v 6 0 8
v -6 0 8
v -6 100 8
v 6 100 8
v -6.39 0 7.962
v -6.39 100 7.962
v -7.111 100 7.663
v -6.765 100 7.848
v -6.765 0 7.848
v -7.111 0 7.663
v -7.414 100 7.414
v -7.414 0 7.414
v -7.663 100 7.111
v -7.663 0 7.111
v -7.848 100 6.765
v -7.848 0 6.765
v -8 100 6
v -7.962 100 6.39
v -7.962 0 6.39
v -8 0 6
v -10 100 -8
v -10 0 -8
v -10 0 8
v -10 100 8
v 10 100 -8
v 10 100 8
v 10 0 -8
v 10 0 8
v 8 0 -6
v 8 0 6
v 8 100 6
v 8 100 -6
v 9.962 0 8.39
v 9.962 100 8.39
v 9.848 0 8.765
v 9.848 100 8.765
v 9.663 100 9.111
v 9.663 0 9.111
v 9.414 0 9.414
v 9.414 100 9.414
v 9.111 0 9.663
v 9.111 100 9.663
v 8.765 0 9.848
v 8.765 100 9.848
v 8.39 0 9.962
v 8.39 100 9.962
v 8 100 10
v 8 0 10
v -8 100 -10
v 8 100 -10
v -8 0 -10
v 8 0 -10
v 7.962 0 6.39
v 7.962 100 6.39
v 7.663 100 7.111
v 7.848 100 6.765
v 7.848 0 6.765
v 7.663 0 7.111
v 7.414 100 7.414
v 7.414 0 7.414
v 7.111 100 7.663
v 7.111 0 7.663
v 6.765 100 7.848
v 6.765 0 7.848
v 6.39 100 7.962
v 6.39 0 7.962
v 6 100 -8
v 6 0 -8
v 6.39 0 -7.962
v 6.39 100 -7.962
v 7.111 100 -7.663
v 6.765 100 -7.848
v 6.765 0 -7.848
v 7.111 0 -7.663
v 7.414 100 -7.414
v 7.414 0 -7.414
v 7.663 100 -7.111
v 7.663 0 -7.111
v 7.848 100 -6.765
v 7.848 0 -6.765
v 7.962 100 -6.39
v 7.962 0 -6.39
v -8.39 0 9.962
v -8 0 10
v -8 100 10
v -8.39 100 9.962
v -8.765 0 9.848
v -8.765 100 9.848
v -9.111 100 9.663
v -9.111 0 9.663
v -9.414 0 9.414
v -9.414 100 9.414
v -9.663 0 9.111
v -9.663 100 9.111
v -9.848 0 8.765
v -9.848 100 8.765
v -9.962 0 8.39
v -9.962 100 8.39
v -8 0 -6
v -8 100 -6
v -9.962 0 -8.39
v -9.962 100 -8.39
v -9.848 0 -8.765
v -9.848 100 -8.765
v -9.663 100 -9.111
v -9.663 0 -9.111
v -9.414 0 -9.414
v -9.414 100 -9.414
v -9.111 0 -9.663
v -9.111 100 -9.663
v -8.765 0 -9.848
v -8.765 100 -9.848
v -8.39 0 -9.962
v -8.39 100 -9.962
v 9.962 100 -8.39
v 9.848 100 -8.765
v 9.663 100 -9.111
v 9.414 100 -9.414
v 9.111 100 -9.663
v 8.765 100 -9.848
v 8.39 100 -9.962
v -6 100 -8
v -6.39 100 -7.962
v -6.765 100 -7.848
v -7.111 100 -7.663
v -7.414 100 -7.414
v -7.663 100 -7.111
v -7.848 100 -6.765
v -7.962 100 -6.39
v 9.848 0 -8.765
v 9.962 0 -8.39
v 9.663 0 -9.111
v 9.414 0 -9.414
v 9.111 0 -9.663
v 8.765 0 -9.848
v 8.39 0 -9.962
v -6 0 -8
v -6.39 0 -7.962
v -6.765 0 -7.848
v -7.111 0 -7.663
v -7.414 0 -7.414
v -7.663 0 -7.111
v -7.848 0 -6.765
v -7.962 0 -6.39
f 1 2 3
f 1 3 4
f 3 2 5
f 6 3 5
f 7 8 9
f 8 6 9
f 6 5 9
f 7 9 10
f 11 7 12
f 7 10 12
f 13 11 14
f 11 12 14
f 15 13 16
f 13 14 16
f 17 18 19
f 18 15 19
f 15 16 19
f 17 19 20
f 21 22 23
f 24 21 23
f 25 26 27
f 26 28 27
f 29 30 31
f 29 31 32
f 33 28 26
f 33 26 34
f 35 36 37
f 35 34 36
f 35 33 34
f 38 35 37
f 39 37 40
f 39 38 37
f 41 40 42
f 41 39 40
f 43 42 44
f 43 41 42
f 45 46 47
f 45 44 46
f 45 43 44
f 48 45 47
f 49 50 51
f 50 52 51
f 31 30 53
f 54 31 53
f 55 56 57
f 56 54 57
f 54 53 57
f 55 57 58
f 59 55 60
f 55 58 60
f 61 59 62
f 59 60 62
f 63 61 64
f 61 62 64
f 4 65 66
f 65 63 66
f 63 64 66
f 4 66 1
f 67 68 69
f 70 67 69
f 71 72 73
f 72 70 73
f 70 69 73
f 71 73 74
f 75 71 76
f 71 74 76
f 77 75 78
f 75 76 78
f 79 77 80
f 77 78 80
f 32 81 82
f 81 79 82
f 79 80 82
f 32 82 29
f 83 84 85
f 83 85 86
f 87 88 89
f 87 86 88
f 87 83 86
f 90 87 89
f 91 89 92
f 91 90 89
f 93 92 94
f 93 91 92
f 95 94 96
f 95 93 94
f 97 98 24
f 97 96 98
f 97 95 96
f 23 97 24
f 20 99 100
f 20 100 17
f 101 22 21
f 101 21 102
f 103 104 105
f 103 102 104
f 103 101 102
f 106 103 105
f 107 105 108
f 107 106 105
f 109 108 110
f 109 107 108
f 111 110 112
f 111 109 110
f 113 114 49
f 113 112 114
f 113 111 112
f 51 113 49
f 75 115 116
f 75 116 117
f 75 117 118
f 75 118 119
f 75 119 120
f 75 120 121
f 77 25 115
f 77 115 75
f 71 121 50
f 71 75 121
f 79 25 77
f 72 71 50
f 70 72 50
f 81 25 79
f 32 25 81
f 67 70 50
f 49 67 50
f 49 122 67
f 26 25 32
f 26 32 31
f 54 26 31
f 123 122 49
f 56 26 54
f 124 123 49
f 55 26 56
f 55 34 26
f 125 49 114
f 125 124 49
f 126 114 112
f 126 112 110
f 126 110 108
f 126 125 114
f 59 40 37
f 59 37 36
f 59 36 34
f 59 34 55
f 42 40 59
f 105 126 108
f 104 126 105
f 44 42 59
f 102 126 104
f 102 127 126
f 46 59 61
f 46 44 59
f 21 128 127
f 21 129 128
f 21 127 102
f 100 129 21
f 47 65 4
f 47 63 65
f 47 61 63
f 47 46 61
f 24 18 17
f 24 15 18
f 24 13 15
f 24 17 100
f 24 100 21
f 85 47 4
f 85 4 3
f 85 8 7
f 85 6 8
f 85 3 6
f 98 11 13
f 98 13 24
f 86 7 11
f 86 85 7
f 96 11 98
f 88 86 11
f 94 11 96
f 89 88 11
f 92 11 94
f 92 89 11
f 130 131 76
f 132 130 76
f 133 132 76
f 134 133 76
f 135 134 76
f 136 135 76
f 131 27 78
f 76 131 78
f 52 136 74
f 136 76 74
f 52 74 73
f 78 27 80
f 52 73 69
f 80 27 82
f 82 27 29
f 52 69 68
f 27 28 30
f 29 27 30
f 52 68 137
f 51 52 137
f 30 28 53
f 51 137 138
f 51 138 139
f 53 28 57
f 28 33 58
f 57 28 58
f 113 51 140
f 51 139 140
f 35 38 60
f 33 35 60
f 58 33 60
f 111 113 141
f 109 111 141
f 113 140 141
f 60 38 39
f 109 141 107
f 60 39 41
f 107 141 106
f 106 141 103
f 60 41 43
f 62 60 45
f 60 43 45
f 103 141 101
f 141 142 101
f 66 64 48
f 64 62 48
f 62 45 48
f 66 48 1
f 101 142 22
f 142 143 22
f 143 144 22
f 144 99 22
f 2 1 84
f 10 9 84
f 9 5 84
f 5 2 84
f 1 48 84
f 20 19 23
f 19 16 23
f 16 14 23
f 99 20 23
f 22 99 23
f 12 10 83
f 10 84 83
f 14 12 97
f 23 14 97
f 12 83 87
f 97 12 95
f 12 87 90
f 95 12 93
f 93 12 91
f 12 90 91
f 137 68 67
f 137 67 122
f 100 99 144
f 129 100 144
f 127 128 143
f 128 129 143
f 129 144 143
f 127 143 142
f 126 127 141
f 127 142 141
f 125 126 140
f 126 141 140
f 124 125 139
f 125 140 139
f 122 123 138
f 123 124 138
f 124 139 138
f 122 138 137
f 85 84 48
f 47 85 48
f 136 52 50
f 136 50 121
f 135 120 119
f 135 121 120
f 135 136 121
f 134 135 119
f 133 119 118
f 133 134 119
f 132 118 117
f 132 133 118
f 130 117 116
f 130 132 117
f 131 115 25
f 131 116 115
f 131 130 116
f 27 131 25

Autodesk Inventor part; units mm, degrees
ref_plane "YZ Plane" through (0, 0, 0) normal (1, 0, 0) x (0, 1, 0)
ref_plane "XZ Plane" through (0, 0, 0) normal (0, 1, 0) x (-1, 0, 0)
ref_plane "XY Plane" through (0, 0, 0) normal (0, 0, 1) x (1, 0, 0)
sketch "Sketch1" plane through (0, 0, 0) normal (0, 1, 0) x (-1, 0, 0)
  line L0 (-8, -10) -> (8, -10)
  line L1 (10, -8) -> (10, 8)
  line L2 (8, 10) -> (-8, 10)
  line L3 (-10, 8) -> (-10, -8)
  line L4 (-10, -10) -> (10, 10) construction
  line L5 (10, -10) -> (-10, 10) construction
  line L6 (-6, -8) -> (6, -8)
  line L7 (8, -6) -> (8, 6)
  line L8 (6, 8) -> (-6, 8)
  line L9 (-8, 6) -> (-8, -6)
  line L10 (-8, -8) -> (8, 8) construction
  line L11 (8, -8) -> (-8, 8) construction
  arc A0 (10, 8) -> (8, 10) centre (8, 8) ccw
  arc A1 (8, 6) -> (6, 8) centre (6, 6) ccw
  arc A2 (8, -10) -> (10, -8) centre (8, -8) ccw
  arc A3 (6, -8) -> (8, -6) centre (6, -6) ccw
  arc A4 (-10, -8) -> (-8, -10) centre (-8, -8) ccw
  arc A5 (-8, -6) -> (-6, -8) centre (-6, -6) ccw
  arc A6 (-6, 8) -> (-8, 6) centre (-6, 6) ccw
  arc A7 (-8, 10) -> (-10, 8) centre (-8, 8) ccw
  point P0 (0, 0)
  dimension "width" = 20
  dimension "depth" = 20
  dimension "thickness" = 2
  dimension "d3" = 2
extrude "Extrusion1" add sketch "Sketch1" along normal blind 100
equation "\"d3\" = thickness"
properties part number "beam 20x20x2" material "Steel"
